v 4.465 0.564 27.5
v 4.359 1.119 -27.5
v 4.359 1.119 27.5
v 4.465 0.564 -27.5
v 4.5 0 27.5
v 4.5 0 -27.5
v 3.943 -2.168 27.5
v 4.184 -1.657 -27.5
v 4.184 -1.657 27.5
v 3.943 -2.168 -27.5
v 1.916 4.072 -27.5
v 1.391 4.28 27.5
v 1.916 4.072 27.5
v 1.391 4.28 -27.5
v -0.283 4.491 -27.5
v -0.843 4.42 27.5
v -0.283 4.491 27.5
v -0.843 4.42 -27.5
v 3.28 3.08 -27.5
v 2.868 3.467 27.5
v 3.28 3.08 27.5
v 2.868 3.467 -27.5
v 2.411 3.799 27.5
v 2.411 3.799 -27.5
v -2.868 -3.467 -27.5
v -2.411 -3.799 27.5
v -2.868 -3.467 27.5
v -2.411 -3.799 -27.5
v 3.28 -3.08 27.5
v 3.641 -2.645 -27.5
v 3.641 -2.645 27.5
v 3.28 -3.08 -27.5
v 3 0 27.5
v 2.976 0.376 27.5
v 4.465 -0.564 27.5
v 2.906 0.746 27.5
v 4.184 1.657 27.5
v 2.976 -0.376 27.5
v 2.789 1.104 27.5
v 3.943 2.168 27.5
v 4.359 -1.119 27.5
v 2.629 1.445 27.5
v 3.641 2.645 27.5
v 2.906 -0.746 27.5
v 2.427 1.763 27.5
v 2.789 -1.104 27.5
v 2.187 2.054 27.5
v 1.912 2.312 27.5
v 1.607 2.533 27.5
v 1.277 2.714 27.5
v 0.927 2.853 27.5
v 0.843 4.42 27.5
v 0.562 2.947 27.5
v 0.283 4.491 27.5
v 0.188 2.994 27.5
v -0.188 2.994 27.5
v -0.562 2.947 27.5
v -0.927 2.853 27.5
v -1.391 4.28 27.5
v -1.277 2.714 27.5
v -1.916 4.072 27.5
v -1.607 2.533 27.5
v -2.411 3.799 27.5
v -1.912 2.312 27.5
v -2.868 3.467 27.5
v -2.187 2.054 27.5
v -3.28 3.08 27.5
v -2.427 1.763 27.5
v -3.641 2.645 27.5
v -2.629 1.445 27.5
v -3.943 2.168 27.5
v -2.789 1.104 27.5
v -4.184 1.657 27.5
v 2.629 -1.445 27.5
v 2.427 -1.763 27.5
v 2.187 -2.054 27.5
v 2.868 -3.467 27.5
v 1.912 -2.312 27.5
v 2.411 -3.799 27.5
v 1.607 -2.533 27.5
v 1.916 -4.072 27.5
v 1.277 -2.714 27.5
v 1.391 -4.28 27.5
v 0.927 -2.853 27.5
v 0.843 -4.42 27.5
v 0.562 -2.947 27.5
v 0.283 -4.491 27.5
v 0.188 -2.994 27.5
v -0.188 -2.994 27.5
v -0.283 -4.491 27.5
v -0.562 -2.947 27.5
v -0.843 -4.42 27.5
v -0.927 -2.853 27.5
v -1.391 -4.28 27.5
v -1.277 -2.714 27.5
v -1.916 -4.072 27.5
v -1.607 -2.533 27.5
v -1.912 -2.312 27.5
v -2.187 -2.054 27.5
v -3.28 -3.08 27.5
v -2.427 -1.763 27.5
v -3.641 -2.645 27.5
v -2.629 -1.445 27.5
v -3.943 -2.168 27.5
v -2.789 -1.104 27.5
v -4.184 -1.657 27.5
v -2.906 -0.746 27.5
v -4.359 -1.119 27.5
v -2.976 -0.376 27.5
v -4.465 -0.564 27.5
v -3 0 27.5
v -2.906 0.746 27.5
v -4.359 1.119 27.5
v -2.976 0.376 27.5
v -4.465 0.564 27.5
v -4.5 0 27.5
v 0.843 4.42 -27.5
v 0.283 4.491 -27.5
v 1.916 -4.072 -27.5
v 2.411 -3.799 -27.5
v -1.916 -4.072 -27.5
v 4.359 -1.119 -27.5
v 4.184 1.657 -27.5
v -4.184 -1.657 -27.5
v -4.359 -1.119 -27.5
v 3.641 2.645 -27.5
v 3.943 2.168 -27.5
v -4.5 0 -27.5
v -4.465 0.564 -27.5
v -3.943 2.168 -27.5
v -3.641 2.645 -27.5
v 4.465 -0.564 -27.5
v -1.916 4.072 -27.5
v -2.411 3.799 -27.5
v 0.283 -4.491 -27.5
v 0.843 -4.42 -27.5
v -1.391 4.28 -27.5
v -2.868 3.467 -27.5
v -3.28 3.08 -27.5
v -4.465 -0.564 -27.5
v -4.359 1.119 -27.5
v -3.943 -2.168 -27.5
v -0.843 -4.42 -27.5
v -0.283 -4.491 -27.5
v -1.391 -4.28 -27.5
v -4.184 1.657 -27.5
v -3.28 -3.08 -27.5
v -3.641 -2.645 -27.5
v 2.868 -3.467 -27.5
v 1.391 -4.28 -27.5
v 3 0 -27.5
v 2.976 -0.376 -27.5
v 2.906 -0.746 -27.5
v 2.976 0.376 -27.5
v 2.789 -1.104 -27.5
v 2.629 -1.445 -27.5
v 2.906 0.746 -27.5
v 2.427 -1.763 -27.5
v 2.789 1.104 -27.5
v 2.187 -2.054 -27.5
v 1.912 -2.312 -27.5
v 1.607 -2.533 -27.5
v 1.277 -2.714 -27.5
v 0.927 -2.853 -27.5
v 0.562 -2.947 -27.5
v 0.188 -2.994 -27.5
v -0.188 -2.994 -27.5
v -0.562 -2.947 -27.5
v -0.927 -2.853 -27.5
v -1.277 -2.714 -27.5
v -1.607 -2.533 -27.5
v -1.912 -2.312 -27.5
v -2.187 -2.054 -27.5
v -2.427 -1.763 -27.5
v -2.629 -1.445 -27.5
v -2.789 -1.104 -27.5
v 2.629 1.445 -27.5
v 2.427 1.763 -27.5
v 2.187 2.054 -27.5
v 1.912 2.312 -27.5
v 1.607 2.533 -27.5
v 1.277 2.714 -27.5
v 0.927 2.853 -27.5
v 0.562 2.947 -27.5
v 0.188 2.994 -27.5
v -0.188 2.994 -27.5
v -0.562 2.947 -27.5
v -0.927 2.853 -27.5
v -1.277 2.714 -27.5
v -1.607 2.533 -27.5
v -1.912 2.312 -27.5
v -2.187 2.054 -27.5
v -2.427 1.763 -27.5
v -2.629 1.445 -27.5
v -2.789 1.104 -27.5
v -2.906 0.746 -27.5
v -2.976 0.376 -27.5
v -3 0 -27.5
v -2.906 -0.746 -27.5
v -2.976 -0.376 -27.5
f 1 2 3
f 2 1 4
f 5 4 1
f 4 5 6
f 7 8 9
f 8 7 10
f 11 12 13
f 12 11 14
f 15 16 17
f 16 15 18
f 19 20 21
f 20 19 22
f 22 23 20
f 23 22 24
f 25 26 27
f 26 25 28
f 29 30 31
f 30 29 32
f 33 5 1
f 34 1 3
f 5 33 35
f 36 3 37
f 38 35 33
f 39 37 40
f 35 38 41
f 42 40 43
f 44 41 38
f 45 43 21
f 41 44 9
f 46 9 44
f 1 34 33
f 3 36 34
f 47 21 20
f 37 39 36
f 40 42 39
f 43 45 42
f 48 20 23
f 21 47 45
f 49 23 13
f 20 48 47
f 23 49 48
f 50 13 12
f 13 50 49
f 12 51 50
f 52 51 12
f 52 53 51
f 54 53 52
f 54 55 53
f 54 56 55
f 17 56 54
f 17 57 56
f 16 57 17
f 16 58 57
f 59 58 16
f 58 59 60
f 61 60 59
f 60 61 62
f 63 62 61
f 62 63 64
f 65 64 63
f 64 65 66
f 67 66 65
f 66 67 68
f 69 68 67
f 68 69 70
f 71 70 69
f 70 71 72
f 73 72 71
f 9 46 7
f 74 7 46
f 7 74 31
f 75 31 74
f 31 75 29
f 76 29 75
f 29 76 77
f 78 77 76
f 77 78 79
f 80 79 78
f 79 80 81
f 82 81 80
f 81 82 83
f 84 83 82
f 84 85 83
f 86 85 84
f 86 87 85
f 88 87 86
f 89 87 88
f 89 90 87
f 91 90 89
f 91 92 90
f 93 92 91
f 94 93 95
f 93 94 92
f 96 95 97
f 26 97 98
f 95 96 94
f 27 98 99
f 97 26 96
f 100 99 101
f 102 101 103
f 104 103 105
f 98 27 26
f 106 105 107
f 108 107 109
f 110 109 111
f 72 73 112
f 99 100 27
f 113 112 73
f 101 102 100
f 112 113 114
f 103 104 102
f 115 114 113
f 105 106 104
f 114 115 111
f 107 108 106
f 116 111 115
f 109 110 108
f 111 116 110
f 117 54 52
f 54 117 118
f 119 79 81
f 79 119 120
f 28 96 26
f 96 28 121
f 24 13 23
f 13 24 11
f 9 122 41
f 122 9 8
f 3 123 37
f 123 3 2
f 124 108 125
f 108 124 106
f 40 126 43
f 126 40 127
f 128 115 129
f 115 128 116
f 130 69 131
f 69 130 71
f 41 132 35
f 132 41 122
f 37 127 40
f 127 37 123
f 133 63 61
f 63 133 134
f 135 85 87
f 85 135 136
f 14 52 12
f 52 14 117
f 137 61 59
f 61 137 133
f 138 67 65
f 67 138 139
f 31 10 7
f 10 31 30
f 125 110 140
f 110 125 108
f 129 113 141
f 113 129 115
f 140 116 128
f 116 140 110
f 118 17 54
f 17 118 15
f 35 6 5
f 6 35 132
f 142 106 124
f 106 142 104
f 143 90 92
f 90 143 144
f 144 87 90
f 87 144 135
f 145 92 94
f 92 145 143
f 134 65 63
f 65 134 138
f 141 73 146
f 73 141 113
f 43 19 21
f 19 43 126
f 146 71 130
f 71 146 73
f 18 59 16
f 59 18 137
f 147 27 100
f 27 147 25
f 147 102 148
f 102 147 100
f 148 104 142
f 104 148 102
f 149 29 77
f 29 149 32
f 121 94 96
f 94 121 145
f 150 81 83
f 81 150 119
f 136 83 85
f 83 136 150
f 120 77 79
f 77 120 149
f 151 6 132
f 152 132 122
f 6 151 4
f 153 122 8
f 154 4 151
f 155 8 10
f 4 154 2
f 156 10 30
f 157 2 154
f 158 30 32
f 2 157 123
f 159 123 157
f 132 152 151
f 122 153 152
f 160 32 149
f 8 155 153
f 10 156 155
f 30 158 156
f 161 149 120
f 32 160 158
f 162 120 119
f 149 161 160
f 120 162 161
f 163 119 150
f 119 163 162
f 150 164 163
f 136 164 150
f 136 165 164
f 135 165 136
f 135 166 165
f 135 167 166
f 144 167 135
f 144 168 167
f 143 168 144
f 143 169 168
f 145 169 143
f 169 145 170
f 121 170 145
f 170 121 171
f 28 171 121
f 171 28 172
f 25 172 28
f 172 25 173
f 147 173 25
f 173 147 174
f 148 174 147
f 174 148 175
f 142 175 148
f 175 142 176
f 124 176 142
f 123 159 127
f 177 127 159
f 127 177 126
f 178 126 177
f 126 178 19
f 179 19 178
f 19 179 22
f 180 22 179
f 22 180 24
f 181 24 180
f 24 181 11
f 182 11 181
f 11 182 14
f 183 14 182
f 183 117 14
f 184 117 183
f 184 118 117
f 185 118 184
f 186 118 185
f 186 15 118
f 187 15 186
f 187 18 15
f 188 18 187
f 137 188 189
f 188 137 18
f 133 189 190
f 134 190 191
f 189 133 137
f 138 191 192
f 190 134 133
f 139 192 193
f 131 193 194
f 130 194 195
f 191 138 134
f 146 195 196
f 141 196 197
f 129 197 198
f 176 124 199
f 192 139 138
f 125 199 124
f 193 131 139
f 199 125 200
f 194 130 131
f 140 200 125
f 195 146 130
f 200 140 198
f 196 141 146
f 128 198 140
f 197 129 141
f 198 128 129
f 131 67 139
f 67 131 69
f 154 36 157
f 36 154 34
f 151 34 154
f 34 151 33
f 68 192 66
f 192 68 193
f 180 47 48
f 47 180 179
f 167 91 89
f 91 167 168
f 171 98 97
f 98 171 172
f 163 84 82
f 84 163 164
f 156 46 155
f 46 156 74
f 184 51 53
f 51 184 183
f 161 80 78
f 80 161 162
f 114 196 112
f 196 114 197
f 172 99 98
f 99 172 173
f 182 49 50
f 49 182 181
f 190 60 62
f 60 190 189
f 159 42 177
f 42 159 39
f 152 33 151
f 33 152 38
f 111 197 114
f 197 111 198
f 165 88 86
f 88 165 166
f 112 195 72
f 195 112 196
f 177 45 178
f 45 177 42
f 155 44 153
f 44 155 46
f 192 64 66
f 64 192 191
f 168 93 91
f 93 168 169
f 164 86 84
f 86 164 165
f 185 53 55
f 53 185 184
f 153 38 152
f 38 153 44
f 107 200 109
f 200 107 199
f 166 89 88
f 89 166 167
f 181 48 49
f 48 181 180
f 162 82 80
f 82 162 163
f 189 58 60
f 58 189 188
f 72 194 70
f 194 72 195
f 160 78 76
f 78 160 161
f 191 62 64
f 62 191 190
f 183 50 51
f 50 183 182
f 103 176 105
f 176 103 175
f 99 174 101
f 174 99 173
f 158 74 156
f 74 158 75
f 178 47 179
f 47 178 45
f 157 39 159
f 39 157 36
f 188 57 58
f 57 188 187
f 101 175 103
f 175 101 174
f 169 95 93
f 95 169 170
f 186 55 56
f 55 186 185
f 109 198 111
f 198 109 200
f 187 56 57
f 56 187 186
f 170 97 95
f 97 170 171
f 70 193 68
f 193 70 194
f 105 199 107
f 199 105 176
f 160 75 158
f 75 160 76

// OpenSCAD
$fn = 50;


difference() {
	union() {
		translate(v = [0, 0, -27.5000000000]) {
			cylinder(h = 55, r = 4.5000000000);
		}
	}
	union() {
		translate(v = [0, 0, -100.0000000000]) {
			cylinder(h = 200, r = 3.0000000000);
		}
	}
}
